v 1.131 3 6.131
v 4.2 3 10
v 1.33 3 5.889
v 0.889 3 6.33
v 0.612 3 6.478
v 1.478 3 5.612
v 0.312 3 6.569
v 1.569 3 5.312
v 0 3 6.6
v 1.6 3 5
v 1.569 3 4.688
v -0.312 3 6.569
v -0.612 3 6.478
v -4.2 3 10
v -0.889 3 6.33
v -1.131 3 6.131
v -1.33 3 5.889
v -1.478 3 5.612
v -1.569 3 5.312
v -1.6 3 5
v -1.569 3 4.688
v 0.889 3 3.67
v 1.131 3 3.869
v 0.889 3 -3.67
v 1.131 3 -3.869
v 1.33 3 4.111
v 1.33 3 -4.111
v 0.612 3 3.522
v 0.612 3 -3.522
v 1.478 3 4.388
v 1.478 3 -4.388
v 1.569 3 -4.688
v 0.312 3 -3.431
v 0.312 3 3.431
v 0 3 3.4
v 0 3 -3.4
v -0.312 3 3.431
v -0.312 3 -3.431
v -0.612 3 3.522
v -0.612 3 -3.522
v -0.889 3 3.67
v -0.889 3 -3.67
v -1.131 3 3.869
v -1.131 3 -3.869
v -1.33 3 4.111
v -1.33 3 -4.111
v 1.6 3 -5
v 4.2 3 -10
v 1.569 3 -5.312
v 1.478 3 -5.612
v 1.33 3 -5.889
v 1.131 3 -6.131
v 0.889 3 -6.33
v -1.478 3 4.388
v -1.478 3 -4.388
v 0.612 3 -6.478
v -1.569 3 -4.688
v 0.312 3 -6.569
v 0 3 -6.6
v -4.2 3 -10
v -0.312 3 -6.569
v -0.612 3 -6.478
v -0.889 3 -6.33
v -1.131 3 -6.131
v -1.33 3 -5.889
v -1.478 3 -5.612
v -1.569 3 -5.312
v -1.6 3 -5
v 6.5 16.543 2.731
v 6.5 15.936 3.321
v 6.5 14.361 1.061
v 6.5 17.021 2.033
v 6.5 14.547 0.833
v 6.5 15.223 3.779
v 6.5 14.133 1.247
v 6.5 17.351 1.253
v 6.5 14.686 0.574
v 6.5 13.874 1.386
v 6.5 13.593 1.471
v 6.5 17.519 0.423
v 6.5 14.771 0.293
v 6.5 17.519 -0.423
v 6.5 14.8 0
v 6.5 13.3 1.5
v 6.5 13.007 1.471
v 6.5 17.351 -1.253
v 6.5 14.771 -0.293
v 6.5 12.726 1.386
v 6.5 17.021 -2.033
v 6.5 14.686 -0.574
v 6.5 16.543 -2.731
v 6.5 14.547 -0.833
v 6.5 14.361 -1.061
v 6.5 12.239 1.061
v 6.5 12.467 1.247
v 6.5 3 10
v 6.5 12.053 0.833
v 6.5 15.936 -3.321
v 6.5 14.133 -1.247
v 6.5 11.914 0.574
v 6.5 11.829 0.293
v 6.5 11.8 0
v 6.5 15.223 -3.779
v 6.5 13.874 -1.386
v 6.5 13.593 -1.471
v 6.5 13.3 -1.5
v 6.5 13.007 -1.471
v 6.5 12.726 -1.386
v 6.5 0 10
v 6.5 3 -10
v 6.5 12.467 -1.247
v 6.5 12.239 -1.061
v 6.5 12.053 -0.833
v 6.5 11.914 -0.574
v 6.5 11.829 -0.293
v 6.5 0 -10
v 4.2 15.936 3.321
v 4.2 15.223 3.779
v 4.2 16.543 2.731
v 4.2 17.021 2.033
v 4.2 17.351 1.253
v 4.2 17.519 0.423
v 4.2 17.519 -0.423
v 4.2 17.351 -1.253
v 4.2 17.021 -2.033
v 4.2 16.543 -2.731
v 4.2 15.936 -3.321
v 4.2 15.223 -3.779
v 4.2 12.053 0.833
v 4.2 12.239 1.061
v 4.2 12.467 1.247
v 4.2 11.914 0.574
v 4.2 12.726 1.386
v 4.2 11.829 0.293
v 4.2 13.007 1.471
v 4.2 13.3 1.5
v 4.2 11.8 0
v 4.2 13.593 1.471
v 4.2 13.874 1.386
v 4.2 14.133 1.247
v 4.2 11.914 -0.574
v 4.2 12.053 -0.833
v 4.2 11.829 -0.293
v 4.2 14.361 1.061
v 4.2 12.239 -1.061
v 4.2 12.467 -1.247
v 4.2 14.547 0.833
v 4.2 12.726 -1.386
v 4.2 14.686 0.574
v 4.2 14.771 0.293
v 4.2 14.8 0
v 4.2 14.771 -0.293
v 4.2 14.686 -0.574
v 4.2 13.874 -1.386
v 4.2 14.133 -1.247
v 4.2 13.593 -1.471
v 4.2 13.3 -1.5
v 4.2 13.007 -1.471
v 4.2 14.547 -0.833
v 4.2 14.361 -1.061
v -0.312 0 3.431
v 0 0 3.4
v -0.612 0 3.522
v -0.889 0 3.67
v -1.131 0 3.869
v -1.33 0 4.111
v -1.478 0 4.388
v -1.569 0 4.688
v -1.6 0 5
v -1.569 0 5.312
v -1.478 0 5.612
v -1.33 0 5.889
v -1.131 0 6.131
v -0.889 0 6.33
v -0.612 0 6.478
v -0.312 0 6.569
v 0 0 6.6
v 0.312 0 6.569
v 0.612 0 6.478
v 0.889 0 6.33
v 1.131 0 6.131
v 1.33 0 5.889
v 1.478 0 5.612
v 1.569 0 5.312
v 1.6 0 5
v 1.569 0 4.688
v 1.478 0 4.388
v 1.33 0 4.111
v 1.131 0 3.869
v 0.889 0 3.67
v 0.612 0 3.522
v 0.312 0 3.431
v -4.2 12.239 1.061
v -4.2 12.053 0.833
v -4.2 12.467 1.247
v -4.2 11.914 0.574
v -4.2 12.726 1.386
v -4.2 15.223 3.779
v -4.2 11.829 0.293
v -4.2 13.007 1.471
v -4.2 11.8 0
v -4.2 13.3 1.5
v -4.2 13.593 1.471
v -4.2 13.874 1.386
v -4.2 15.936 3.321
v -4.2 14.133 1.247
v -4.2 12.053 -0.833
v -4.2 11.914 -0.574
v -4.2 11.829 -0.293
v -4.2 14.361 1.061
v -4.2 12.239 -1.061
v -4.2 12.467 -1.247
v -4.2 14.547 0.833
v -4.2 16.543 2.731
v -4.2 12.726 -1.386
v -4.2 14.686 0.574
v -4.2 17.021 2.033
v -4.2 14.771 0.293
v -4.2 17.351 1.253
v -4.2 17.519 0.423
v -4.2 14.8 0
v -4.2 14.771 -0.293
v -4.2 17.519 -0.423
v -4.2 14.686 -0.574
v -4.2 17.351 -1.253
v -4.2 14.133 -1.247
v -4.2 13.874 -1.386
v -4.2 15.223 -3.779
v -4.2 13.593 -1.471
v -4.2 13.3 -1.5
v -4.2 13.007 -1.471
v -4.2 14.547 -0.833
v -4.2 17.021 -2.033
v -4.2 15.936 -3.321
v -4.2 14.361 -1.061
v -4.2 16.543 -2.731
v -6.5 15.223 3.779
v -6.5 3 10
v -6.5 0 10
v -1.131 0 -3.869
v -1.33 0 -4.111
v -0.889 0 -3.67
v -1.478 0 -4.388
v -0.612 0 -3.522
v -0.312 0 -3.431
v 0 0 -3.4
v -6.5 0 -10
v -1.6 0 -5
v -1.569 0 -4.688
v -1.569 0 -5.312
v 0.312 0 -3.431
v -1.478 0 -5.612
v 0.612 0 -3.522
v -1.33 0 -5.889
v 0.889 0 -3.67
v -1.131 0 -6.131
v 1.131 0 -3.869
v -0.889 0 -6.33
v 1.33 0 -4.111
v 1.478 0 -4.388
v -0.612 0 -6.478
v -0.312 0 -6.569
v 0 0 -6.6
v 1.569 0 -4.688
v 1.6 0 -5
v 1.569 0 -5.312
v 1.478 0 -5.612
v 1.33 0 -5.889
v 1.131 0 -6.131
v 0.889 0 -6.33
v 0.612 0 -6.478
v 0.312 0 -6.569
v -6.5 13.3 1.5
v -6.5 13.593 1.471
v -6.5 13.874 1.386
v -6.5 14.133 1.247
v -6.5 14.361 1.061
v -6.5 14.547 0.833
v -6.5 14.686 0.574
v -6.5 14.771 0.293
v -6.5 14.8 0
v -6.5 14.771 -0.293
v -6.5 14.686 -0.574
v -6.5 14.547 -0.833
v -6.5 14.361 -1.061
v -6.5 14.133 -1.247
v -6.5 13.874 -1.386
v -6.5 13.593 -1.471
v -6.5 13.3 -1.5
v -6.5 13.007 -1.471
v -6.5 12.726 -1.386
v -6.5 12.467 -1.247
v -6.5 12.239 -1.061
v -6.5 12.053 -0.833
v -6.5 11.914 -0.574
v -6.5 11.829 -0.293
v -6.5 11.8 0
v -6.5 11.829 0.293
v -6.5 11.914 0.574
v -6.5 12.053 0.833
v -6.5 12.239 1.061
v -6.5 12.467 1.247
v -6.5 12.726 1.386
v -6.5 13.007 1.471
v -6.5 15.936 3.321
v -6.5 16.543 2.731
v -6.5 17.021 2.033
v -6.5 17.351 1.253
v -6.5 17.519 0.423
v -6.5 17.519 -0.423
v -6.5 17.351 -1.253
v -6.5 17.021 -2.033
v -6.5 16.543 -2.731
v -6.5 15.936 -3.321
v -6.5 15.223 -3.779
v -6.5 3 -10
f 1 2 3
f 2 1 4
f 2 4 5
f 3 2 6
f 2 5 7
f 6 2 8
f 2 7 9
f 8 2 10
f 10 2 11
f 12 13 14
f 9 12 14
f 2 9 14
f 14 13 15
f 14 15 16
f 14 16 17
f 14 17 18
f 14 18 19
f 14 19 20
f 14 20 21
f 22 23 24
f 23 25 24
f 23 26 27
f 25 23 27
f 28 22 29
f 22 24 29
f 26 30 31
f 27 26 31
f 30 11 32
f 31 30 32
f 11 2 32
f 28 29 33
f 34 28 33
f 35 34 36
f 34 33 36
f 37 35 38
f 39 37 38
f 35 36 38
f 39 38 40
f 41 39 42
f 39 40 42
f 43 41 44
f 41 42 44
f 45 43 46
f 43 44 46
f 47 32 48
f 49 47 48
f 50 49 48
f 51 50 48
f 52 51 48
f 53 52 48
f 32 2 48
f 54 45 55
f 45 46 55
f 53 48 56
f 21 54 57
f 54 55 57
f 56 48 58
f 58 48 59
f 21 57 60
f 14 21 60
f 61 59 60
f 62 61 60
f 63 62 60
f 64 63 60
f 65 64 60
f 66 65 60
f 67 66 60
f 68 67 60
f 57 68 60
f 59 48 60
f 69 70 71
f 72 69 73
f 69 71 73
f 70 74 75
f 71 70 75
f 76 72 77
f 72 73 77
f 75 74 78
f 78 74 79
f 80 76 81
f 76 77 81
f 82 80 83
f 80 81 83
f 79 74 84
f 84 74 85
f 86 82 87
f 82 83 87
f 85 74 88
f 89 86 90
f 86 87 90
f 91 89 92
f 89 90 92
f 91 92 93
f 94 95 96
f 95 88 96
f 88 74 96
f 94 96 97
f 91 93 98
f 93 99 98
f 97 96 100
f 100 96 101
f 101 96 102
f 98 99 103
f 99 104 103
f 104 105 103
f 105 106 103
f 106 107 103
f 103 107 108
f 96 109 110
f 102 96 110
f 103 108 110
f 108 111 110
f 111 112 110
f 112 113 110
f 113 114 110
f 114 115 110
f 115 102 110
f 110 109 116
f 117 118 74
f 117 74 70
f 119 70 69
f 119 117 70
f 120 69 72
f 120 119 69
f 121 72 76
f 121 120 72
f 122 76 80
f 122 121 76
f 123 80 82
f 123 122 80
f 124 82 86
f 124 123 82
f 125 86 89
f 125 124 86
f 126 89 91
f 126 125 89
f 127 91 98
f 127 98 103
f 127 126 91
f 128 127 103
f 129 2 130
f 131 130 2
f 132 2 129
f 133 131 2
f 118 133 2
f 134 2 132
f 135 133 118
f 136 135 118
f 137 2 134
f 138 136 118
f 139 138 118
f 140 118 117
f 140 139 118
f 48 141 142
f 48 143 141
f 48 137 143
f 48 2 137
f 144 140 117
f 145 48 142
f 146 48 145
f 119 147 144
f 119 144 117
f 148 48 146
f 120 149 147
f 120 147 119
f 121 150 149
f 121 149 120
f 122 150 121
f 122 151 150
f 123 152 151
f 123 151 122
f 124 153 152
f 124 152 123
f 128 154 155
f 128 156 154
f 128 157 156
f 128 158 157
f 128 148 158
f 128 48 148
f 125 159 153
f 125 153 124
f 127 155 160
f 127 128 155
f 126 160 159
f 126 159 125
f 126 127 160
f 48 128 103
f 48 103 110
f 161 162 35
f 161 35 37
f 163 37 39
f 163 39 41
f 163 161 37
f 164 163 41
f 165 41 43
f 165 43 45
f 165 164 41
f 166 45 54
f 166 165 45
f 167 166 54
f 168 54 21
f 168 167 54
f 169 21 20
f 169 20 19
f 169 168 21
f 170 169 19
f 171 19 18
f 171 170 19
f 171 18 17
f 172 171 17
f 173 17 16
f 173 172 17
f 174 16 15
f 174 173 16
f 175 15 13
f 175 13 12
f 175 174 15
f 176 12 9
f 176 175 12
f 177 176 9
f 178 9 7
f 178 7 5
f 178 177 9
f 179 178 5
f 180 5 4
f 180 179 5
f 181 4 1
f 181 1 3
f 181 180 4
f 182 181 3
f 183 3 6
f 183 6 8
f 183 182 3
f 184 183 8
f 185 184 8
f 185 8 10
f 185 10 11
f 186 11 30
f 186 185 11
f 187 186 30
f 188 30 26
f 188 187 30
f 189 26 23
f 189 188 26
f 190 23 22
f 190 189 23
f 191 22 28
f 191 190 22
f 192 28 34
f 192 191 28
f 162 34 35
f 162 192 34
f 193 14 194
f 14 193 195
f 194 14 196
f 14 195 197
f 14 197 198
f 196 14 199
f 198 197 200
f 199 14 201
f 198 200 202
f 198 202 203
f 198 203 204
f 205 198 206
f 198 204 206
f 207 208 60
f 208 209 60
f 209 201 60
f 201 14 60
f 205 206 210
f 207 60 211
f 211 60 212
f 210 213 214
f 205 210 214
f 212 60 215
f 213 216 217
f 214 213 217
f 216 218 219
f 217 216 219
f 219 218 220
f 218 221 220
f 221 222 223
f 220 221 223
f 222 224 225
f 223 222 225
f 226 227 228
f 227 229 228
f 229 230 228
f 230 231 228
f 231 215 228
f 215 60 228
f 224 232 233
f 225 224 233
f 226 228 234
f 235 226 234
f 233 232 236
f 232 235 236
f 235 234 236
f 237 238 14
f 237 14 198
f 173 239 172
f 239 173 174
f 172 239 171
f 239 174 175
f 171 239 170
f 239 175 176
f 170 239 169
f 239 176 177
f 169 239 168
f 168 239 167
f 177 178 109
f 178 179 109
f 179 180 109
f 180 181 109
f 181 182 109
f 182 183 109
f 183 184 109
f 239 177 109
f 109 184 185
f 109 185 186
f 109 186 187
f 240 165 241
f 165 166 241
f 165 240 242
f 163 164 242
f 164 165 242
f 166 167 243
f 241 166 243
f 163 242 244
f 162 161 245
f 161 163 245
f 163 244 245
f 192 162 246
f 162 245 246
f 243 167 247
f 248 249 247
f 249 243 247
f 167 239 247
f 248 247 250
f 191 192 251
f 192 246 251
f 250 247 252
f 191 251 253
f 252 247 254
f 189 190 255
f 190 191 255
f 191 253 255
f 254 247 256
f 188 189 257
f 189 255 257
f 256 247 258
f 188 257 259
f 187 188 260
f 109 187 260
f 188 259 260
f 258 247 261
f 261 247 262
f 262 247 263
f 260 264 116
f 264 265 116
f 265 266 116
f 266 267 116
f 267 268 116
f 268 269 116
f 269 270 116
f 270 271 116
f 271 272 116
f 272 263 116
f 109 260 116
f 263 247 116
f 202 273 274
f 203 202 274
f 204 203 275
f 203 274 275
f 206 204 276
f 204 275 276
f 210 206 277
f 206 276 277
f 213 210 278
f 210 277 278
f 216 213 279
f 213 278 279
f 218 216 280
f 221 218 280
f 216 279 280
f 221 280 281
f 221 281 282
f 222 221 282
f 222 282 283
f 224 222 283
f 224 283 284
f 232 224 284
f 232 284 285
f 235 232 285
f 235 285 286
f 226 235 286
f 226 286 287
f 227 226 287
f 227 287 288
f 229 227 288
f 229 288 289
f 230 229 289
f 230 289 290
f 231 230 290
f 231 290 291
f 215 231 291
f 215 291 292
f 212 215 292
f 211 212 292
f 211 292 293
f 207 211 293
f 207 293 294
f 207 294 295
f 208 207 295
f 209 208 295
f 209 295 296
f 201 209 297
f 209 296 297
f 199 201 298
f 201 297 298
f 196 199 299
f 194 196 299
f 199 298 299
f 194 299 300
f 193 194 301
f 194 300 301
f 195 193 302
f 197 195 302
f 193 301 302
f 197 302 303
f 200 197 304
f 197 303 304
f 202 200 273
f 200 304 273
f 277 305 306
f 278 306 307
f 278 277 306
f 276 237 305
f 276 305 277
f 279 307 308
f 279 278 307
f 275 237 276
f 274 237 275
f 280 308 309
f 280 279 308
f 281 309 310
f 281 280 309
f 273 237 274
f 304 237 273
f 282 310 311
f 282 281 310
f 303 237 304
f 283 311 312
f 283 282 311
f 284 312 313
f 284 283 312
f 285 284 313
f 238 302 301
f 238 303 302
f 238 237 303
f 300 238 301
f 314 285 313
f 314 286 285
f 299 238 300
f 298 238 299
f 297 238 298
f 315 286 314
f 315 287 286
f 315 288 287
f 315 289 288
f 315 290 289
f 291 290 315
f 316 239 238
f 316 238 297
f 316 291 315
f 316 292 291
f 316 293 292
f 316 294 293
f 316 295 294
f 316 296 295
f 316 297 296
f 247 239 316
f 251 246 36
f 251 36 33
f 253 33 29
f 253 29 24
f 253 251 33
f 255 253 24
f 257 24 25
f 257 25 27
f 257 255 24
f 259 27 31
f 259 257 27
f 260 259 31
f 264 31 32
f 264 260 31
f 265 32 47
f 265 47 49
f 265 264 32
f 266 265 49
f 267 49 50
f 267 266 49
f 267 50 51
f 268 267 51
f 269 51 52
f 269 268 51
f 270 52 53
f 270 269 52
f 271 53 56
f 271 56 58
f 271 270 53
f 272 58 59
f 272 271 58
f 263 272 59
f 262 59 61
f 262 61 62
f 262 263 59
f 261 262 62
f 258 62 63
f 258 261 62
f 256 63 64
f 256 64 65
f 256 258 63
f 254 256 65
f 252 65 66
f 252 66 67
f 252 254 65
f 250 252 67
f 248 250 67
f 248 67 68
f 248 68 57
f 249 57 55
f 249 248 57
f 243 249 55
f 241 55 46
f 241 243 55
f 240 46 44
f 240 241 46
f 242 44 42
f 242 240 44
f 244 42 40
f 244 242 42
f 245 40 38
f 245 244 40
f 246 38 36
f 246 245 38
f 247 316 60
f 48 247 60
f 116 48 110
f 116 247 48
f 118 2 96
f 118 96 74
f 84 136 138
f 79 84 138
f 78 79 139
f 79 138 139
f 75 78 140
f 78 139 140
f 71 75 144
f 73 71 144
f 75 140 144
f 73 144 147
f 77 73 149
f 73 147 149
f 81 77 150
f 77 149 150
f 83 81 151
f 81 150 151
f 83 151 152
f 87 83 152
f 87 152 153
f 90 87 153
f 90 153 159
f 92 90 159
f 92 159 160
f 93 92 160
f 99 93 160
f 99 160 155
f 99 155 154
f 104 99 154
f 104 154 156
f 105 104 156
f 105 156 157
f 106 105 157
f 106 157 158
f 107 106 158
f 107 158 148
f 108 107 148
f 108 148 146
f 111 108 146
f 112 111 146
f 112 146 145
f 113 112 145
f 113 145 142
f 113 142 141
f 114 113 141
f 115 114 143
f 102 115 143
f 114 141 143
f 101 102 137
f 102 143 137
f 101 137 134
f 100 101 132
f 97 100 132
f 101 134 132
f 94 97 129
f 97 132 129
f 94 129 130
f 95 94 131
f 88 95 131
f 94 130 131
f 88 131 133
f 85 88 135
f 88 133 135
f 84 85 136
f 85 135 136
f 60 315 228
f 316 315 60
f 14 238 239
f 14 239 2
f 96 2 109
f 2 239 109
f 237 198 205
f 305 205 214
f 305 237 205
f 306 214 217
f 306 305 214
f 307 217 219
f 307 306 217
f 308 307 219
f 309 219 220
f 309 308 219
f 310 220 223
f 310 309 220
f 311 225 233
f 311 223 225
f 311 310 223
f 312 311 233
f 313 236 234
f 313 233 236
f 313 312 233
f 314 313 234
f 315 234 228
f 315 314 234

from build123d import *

# Parameters (mm, degrees)
SKETCH_1_W          = 13
SKETCH_1_H          = 20
SKETCH_1_R          = 1.6
EXTRUDE_1_DEPTH     = 3
SKETCH_2_R          = 1.5
EXTRUDE_2_DEPTH     = 13
SKETCH_3_W          = 8.4
SKETCH_3_H          = 14.54
CUT_EXTRUDE_1_DEPTH = 28.384331286


with BuildPart() as part:
    # 草图1 → 凸台-拉伸1 (new body)
    with BuildSketch(Plane(origin=(0, 0, 0), x_dir=(1, 0, 0), z_dir=(0, 1, 0))):
        Rectangle(SKETCH_1_W, SKETCH_1_H)
        with Locations(Location((0, 5, 0), (0, 0, 270))):
            Circle(SKETCH_1_R, mode=Mode.SUBTRACT)
        with Locations(Location((0, -5, 0), (0, 0, 90))):
            Circle(SKETCH_1_R, mode=Mode.SUBTRACT)
    extrude(amount=EXTRUDE_1_DEPTH)

    # 草图2 → 凸台-拉伸2 (add)
    with BuildSketch(Plane.ZY.offset(6.5)):
        with BuildLine():
            Line((-10, 3), (10, 3))
            Line((10, 3), (3.778714502, 15.223256798))
            ThreePointArc((3.778714502, 15.223256798), (0, 17.54), (-3.778714502, 15.223256798))
            Line((-3.778714502, 15.223256798), (-10, 3))
        make_face()
        with Locations((0, 13.3)):
            Circle(SKETCH_2_R, mode=Mode.SUBTRACT)
    extrude(amount=-EXTRUDE_2_DEPTH)

    # 草图3 → 切除-拉伸1 (cut, through all)
    with BuildSketch(Plane(origin=(0, 0, -10), x_dir=(-1, 0, 0), z_dir=(0, 0, -1))):
        with Locations((0, 10.27)):
            Rectangle(SKETCH_3_W, SKETCH_3_H)
    extrude(amount=-CUT_EXTRUDE_1_DEPTH, mode=Mode.SUBTRACT)


solid = part.part
